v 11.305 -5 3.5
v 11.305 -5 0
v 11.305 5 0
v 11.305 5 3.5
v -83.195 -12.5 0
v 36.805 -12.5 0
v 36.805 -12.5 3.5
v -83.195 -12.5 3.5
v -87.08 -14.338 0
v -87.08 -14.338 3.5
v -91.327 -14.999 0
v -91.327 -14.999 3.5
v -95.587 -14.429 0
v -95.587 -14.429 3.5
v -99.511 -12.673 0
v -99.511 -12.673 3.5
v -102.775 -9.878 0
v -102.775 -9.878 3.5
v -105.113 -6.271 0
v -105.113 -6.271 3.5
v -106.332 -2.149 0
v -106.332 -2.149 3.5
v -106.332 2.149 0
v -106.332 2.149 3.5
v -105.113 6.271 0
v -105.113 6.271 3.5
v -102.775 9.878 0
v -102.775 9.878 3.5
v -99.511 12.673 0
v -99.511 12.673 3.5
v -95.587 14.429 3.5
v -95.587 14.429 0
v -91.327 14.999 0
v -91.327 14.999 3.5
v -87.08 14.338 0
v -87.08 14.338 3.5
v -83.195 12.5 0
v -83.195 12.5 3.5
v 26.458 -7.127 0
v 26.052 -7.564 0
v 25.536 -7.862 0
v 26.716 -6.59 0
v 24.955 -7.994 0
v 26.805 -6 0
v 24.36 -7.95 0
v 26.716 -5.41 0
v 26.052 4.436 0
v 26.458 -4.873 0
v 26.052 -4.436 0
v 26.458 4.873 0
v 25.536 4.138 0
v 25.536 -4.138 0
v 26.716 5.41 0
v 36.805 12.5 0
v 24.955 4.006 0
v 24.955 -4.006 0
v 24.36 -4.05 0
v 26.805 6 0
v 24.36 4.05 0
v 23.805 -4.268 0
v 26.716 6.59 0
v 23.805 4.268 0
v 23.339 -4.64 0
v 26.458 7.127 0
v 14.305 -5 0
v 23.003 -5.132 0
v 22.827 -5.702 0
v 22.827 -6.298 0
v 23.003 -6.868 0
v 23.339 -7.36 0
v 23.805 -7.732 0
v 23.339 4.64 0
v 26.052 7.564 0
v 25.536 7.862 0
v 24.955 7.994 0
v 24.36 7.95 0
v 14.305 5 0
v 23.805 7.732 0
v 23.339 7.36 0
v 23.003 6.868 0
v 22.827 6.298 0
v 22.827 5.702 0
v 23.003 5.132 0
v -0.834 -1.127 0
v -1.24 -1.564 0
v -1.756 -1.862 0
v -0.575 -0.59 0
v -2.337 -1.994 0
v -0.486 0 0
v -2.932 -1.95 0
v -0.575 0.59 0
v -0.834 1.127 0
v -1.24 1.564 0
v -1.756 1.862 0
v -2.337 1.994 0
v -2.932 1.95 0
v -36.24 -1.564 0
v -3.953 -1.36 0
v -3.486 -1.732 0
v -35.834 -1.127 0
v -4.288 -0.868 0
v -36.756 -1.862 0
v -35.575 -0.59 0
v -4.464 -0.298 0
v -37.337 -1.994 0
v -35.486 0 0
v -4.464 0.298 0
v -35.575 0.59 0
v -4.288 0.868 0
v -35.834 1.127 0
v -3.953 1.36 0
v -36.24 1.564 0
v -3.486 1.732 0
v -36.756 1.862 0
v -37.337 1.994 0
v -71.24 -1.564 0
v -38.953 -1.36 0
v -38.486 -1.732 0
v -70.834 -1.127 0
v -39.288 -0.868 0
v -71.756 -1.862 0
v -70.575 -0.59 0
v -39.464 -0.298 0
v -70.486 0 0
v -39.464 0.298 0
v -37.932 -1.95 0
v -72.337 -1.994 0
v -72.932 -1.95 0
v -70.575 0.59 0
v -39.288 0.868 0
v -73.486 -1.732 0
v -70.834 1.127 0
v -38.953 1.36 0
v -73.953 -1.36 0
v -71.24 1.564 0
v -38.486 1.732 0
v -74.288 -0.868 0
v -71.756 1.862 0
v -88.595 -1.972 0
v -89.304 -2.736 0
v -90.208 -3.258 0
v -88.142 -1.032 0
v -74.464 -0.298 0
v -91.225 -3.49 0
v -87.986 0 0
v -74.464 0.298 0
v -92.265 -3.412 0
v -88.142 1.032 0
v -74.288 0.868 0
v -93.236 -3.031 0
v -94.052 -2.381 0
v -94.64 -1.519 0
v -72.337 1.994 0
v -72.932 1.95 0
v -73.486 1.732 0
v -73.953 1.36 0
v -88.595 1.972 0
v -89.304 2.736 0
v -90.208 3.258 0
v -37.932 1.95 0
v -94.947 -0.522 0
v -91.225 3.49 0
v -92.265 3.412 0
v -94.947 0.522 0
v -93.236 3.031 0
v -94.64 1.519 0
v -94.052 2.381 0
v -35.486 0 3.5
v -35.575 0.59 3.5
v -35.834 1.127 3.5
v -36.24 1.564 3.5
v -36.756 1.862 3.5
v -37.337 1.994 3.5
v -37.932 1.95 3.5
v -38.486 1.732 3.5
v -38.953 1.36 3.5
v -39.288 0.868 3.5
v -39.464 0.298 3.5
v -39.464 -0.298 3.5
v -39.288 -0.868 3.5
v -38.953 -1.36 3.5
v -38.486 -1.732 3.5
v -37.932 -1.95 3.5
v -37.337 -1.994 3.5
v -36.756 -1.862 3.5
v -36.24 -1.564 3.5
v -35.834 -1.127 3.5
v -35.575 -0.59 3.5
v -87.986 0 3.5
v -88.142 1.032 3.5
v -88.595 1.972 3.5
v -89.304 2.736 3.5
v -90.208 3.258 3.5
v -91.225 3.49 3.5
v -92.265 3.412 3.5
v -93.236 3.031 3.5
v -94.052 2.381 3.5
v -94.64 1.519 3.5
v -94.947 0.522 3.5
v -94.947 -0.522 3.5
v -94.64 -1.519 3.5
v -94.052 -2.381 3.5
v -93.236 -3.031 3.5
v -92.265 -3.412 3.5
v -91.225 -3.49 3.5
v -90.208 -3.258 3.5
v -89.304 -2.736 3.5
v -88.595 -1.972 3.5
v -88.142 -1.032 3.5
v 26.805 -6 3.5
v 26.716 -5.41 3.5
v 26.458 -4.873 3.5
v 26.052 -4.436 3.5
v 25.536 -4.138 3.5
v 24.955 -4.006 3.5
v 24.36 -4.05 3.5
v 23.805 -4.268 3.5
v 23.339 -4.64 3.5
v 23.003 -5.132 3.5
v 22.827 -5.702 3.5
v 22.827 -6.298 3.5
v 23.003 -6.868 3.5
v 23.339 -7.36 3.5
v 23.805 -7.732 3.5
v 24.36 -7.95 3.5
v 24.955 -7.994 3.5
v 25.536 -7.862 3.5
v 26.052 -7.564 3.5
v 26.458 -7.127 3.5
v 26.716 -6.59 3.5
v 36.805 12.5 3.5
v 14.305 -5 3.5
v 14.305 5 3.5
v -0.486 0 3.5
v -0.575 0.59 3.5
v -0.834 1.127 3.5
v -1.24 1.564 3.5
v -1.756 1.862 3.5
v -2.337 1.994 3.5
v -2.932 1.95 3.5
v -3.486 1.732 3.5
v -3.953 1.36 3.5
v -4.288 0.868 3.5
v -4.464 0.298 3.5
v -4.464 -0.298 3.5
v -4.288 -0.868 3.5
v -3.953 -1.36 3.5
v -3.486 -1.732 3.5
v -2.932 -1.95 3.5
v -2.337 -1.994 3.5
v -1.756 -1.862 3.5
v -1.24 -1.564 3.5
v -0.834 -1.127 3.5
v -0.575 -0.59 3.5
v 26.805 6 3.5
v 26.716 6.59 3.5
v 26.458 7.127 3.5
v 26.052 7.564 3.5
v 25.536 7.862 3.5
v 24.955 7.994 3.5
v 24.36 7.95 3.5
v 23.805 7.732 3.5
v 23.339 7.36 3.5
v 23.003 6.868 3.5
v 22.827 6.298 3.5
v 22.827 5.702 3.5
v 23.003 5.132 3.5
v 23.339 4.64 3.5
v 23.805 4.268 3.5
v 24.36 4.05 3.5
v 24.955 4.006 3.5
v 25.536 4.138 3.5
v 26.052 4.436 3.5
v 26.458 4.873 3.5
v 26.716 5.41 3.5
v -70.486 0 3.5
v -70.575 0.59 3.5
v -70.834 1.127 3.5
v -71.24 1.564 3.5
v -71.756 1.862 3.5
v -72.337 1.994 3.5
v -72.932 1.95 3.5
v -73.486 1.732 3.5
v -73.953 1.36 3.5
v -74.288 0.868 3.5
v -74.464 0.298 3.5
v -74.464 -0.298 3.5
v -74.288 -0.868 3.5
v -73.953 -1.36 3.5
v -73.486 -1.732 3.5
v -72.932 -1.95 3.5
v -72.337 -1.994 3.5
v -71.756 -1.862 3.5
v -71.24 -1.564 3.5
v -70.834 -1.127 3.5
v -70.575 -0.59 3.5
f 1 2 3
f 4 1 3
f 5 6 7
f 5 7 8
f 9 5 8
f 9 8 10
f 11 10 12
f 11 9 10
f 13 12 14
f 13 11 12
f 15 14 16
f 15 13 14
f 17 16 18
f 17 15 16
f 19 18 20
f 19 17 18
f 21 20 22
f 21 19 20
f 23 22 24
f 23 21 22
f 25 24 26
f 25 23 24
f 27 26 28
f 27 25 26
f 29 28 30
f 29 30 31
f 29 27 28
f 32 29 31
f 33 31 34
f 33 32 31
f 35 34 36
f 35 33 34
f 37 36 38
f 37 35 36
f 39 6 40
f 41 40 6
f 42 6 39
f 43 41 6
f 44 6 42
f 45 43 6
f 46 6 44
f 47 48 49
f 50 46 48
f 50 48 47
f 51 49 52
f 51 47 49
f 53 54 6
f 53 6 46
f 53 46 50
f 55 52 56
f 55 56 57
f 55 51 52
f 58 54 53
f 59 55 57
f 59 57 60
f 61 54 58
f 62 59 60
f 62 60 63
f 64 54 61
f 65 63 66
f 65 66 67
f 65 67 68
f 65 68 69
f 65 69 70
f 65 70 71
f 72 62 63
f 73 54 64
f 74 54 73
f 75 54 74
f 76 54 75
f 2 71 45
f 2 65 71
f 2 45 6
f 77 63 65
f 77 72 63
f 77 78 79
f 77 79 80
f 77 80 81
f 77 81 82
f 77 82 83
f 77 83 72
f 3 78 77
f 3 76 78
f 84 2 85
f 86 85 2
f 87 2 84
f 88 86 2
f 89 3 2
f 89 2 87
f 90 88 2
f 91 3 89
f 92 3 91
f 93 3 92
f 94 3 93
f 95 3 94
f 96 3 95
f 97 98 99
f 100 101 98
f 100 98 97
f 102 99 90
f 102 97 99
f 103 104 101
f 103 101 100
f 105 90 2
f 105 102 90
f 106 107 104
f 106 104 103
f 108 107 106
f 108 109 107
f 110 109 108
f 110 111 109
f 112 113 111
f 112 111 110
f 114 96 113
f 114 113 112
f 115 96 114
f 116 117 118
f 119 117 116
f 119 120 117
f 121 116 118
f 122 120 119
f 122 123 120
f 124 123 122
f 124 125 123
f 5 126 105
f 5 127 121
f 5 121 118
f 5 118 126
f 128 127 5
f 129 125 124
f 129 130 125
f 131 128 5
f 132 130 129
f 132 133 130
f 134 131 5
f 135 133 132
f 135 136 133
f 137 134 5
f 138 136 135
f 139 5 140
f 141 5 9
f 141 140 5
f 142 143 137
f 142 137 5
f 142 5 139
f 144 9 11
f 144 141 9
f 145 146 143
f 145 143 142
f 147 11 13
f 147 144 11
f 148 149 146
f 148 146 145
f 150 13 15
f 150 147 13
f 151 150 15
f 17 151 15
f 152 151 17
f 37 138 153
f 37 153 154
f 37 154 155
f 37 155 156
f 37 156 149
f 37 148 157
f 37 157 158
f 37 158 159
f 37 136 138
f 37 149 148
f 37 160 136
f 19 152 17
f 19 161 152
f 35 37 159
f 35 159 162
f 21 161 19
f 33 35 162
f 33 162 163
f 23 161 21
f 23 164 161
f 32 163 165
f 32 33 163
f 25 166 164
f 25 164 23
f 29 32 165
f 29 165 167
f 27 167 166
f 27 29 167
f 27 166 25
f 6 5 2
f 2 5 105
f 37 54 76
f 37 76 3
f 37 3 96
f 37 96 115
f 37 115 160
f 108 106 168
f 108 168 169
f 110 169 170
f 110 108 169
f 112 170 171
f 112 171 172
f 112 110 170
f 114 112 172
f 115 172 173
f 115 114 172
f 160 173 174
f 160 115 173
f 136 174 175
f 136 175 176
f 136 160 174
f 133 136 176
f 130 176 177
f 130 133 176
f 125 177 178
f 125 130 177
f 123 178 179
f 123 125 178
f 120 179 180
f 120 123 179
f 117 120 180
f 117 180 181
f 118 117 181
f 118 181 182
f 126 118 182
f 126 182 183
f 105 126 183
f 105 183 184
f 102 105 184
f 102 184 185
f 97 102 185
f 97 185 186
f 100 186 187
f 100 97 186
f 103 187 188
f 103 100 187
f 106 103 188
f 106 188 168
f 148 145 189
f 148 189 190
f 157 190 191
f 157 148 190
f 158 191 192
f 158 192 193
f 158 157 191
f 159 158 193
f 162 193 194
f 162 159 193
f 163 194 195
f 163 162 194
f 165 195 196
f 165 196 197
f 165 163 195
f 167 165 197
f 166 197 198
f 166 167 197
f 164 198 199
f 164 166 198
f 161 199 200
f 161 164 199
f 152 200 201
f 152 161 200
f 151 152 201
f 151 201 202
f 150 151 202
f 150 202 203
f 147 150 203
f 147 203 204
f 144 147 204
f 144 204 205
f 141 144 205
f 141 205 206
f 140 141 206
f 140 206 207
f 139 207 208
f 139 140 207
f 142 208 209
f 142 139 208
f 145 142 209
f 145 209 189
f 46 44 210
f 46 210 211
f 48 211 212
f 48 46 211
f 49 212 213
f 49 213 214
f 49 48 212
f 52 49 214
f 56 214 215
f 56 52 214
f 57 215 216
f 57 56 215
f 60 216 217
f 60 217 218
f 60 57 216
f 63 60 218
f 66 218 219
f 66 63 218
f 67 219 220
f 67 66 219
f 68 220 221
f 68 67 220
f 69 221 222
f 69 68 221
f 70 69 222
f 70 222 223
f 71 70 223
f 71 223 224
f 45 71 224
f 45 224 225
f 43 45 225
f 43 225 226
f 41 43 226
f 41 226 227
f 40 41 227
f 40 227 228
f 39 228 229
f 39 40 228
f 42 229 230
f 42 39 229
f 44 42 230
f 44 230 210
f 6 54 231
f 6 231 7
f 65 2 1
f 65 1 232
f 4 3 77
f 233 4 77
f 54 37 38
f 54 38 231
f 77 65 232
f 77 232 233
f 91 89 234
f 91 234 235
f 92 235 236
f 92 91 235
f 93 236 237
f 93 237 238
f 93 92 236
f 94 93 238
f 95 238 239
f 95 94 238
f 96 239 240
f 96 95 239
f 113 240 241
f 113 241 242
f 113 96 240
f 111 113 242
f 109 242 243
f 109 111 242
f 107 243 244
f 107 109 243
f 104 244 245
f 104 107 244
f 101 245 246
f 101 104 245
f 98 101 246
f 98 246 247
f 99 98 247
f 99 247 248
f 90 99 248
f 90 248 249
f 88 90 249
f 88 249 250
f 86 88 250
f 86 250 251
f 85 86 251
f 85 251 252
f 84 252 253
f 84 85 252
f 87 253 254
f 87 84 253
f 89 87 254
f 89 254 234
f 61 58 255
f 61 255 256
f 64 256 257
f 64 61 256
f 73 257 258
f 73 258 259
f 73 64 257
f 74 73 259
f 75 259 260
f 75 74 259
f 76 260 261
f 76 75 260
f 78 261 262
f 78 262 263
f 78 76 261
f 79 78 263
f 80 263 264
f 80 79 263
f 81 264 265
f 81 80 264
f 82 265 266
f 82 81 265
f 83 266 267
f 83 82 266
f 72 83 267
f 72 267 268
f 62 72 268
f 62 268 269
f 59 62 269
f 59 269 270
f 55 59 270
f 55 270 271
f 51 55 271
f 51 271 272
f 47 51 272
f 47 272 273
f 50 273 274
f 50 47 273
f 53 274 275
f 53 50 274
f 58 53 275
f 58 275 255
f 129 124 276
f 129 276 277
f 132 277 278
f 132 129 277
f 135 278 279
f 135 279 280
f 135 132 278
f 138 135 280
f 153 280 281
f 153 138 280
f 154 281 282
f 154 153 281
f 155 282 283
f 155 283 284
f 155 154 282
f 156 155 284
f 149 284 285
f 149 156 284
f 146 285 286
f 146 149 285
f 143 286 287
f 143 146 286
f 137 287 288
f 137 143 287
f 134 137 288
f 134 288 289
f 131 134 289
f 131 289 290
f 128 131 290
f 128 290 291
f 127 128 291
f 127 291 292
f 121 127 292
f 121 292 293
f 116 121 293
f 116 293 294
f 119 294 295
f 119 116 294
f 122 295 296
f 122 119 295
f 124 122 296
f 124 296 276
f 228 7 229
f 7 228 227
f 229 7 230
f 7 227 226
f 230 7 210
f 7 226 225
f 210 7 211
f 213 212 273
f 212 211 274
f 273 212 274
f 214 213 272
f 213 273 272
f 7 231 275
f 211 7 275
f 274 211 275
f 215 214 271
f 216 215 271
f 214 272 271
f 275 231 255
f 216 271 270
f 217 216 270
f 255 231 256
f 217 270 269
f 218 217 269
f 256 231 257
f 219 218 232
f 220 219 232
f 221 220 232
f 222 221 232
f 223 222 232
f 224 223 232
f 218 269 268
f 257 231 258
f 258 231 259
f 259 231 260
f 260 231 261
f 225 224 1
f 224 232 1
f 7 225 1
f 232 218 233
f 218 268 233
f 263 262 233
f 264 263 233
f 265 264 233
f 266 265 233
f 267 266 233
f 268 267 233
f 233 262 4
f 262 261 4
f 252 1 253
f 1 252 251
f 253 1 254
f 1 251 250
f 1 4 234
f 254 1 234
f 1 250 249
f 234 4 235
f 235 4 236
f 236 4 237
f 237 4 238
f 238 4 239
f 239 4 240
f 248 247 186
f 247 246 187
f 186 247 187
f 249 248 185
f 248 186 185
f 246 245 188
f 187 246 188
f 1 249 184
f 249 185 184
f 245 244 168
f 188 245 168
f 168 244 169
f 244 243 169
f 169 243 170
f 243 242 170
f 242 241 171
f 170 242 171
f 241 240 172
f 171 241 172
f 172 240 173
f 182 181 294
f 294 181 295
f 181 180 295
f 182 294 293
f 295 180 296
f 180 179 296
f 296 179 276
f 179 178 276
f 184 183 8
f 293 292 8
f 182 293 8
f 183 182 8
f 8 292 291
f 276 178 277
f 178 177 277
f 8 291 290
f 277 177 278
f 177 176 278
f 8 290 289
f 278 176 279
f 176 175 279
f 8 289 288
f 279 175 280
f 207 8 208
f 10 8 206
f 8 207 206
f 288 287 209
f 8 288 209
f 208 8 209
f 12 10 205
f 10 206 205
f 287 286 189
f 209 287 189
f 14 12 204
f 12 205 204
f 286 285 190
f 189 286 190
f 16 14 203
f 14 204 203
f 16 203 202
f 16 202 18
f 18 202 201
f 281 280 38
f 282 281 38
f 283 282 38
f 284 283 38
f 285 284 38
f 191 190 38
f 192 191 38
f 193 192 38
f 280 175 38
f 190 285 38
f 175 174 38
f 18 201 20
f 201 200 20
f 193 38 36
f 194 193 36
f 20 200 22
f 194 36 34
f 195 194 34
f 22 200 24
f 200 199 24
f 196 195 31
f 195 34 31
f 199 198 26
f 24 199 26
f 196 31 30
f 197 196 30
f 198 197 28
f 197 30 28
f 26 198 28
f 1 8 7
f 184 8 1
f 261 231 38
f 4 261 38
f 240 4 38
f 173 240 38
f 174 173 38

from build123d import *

# Parameters (mm, degrees)
CROQUIS1_R              = 3.5
CROQUIS1_R_2            = 2
CROQUIS1_W              = 3
CROQUIS1_H              = 10
SALIENTE_EXTRUIR2_DEPTH = 3.5


with BuildPart() as part:
    # Croquis1 → Saliente-Extruir2 (new body)
    with BuildSketch(Plane.XY):
        with BuildLine():
            Line((36.805064583, 12.5), (36.805064583, -12.5))
            Line((36.805064583, -12.5), (-83.194935417, -12.5))
            ThreePointArc((-83.194935417, -12.5), (-106.486497393, 0), (-83.194935417, 12.5))
            Line((-83.194935417, 12.5), (36.805064583, 12.5))
        make_face()
        with Locations((-91.486497393, 0)):
            Circle(CROQUIS1_R, mode=Mode.SUBTRACT)
        with Locations((-72.486497393, 0)):
            Circle(CROQUIS1_R_2, mode=Mode.SUBTRACT)
        with Locations((24.805064583, 6)):
            Circle(CROQUIS1_R_2, mode=Mode.SUBTRACT)
        with Locations((24.805064583, -6)):
            Circle(CROQUIS1_R_2, mode=Mode.SUBTRACT)
        with Locations((-37.486497393, 0)):
            Circle(CROQUIS1_R_2, mode=Mode.SUBTRACT)
        with Locations((-2.486497393, 0)):
            Circle(CROQUIS1_R_2, mode=Mode.SUBTRACT)
        with Locations((12.805064583, 0)):
            Rectangle(CROQUIS1_W, CROQUIS1_H, mode=Mode.SUBTRACT)
    extrude(amount=SALIENTE_EXTRUIR2_DEPTH)


solid = part.part
